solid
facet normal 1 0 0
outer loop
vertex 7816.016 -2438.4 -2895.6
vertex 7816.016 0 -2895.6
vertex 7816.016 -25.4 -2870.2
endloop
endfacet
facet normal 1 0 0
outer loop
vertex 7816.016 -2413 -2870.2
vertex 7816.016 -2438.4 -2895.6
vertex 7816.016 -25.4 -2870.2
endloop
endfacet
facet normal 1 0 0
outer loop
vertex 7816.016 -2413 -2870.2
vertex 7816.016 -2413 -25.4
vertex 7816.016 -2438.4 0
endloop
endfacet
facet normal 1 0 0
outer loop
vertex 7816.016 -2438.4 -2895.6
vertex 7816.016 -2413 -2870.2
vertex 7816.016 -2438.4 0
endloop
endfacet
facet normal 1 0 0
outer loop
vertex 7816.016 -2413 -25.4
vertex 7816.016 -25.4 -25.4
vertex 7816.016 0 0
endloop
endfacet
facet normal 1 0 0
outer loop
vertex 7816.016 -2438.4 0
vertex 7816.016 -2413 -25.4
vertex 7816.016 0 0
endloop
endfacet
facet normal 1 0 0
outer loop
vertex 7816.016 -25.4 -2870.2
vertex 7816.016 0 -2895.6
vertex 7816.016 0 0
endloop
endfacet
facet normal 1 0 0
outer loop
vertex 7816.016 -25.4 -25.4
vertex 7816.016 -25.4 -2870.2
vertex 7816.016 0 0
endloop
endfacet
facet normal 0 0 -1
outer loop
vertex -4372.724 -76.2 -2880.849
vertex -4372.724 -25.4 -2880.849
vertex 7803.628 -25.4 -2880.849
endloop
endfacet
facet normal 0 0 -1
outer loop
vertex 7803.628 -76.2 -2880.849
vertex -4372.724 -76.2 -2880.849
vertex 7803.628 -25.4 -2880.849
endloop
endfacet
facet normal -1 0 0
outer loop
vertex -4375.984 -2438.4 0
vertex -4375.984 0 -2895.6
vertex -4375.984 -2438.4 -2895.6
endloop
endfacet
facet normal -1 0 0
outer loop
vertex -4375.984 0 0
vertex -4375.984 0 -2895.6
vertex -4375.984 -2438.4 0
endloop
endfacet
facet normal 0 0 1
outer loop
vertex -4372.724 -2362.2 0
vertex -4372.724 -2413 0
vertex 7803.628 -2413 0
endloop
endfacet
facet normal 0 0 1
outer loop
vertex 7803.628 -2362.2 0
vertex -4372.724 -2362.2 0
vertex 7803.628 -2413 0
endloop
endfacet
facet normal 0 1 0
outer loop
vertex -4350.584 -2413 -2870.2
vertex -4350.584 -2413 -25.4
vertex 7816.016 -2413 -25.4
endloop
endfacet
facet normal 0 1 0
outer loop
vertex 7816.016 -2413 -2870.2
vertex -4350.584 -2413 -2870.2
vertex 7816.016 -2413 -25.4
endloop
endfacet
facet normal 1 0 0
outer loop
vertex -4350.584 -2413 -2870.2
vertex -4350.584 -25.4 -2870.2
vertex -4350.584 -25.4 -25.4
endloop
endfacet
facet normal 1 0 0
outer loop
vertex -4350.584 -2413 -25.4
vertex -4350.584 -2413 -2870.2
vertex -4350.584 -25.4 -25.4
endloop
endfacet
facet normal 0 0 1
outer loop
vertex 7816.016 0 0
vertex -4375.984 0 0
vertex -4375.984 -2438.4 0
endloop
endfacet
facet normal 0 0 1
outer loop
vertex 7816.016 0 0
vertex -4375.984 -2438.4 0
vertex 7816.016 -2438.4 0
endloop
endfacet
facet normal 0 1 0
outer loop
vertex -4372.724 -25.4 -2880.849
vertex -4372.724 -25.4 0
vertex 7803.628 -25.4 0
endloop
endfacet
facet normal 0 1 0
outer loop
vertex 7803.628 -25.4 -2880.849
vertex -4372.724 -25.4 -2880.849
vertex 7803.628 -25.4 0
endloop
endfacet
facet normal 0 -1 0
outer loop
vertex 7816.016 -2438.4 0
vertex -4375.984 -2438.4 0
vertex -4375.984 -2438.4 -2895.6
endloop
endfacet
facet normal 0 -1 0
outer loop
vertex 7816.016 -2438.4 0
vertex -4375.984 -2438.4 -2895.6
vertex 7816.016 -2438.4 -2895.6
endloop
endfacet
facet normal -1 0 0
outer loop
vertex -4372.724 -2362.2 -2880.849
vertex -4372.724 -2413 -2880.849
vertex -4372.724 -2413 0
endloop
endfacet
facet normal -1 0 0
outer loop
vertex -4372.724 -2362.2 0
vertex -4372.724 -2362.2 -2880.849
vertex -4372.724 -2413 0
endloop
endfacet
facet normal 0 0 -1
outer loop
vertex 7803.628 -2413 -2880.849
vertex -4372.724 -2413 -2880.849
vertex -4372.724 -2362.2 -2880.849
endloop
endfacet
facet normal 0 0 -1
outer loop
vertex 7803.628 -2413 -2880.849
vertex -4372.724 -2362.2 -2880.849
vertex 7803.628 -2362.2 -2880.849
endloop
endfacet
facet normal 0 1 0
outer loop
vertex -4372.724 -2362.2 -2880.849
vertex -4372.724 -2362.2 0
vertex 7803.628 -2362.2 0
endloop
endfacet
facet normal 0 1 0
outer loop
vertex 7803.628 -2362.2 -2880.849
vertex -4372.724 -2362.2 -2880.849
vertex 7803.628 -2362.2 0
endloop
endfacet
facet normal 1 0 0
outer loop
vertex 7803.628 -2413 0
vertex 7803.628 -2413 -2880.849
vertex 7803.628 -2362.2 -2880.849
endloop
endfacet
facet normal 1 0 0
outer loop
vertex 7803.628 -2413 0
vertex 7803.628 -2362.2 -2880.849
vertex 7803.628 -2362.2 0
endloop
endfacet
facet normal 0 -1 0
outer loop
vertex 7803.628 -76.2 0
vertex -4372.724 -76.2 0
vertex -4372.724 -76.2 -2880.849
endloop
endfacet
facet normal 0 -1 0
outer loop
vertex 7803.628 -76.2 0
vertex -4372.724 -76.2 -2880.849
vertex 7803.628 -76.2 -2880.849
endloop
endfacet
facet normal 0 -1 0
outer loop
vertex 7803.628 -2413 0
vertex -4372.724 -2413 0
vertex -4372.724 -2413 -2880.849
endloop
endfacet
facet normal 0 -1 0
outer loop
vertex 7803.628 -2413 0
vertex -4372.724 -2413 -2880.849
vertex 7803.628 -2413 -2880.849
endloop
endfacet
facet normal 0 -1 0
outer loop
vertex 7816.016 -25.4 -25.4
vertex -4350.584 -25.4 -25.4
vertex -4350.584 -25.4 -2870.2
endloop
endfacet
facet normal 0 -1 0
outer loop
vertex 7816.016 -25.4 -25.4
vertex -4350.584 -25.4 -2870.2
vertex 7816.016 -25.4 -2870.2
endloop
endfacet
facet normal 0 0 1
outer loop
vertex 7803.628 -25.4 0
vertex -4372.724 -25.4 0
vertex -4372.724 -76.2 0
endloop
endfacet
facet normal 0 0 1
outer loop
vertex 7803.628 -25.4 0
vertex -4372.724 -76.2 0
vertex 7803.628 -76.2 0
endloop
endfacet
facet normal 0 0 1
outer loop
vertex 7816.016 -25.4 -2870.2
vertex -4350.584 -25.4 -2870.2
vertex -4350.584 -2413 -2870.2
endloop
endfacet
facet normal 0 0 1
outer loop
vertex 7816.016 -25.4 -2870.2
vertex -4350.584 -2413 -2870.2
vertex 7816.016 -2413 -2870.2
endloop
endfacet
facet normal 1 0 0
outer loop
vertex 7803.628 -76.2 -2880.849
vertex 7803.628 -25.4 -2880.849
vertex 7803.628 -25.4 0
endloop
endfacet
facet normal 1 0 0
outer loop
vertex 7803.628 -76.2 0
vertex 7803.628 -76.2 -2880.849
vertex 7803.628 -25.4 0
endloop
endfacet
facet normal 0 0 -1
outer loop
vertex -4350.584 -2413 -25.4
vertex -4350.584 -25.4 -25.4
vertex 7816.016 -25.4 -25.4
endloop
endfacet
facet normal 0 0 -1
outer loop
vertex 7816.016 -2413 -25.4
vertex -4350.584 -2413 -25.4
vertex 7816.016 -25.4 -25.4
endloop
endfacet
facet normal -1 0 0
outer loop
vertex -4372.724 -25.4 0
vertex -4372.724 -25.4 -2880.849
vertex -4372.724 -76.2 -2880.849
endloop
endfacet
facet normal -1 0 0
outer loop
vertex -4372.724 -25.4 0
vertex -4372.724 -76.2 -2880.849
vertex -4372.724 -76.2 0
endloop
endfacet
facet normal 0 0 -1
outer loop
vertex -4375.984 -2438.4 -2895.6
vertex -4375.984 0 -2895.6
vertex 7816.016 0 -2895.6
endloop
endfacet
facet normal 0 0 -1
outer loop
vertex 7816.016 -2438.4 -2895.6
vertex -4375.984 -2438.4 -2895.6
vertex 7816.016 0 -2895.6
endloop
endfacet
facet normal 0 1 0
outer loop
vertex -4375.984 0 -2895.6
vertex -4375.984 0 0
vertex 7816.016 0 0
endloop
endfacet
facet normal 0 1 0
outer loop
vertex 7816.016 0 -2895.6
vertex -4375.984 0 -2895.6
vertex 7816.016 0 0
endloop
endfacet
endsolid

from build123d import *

# Parameters (mm, degrees)
F0_W     = 12192
F0_H     = 2895.6
F1_DEPTH = 2438.4
F2_T     = -25.4
F4_W     = 12176.3525009155
F4_H     = 2880.8488845825
F5_DEPTH = 50.8


with BuildPart() as f1:
    # F0 (on Front) → F1 (new body)
    with BuildSketch(Plane.XZ):
        with Locations((1720.0159610172, -1447.8)):
            Rectangle(F0_W, F0_H)
    extrude(amount=F1_DEPTH)

    # F2
    f2_openings = [f1.faces().sort_by_distance(p)[0] for p in [
        (7816.015961, -1219.2, -1447.8),
    ]]
    offset(amount=F2_T, openings=f2_openings)


with BuildPart() as f5:
    # F4 (on offset) → F5 (new body)
    with BuildSketch(Plane.XZ.offset(25.4)):
        with Locations((1715.4521942139, -1440.4244422913)):
            Rectangle(F4_W, F4_H)
    extrude(amount=F5_DEPTH)


with BuildPart() as f7_1:
    # F7: instance of F5
    add(f5.part.mirror(Plane.XZ.offset(1219.2)))


solid = Compound([f1.part, f5.part, f7_1.part])
